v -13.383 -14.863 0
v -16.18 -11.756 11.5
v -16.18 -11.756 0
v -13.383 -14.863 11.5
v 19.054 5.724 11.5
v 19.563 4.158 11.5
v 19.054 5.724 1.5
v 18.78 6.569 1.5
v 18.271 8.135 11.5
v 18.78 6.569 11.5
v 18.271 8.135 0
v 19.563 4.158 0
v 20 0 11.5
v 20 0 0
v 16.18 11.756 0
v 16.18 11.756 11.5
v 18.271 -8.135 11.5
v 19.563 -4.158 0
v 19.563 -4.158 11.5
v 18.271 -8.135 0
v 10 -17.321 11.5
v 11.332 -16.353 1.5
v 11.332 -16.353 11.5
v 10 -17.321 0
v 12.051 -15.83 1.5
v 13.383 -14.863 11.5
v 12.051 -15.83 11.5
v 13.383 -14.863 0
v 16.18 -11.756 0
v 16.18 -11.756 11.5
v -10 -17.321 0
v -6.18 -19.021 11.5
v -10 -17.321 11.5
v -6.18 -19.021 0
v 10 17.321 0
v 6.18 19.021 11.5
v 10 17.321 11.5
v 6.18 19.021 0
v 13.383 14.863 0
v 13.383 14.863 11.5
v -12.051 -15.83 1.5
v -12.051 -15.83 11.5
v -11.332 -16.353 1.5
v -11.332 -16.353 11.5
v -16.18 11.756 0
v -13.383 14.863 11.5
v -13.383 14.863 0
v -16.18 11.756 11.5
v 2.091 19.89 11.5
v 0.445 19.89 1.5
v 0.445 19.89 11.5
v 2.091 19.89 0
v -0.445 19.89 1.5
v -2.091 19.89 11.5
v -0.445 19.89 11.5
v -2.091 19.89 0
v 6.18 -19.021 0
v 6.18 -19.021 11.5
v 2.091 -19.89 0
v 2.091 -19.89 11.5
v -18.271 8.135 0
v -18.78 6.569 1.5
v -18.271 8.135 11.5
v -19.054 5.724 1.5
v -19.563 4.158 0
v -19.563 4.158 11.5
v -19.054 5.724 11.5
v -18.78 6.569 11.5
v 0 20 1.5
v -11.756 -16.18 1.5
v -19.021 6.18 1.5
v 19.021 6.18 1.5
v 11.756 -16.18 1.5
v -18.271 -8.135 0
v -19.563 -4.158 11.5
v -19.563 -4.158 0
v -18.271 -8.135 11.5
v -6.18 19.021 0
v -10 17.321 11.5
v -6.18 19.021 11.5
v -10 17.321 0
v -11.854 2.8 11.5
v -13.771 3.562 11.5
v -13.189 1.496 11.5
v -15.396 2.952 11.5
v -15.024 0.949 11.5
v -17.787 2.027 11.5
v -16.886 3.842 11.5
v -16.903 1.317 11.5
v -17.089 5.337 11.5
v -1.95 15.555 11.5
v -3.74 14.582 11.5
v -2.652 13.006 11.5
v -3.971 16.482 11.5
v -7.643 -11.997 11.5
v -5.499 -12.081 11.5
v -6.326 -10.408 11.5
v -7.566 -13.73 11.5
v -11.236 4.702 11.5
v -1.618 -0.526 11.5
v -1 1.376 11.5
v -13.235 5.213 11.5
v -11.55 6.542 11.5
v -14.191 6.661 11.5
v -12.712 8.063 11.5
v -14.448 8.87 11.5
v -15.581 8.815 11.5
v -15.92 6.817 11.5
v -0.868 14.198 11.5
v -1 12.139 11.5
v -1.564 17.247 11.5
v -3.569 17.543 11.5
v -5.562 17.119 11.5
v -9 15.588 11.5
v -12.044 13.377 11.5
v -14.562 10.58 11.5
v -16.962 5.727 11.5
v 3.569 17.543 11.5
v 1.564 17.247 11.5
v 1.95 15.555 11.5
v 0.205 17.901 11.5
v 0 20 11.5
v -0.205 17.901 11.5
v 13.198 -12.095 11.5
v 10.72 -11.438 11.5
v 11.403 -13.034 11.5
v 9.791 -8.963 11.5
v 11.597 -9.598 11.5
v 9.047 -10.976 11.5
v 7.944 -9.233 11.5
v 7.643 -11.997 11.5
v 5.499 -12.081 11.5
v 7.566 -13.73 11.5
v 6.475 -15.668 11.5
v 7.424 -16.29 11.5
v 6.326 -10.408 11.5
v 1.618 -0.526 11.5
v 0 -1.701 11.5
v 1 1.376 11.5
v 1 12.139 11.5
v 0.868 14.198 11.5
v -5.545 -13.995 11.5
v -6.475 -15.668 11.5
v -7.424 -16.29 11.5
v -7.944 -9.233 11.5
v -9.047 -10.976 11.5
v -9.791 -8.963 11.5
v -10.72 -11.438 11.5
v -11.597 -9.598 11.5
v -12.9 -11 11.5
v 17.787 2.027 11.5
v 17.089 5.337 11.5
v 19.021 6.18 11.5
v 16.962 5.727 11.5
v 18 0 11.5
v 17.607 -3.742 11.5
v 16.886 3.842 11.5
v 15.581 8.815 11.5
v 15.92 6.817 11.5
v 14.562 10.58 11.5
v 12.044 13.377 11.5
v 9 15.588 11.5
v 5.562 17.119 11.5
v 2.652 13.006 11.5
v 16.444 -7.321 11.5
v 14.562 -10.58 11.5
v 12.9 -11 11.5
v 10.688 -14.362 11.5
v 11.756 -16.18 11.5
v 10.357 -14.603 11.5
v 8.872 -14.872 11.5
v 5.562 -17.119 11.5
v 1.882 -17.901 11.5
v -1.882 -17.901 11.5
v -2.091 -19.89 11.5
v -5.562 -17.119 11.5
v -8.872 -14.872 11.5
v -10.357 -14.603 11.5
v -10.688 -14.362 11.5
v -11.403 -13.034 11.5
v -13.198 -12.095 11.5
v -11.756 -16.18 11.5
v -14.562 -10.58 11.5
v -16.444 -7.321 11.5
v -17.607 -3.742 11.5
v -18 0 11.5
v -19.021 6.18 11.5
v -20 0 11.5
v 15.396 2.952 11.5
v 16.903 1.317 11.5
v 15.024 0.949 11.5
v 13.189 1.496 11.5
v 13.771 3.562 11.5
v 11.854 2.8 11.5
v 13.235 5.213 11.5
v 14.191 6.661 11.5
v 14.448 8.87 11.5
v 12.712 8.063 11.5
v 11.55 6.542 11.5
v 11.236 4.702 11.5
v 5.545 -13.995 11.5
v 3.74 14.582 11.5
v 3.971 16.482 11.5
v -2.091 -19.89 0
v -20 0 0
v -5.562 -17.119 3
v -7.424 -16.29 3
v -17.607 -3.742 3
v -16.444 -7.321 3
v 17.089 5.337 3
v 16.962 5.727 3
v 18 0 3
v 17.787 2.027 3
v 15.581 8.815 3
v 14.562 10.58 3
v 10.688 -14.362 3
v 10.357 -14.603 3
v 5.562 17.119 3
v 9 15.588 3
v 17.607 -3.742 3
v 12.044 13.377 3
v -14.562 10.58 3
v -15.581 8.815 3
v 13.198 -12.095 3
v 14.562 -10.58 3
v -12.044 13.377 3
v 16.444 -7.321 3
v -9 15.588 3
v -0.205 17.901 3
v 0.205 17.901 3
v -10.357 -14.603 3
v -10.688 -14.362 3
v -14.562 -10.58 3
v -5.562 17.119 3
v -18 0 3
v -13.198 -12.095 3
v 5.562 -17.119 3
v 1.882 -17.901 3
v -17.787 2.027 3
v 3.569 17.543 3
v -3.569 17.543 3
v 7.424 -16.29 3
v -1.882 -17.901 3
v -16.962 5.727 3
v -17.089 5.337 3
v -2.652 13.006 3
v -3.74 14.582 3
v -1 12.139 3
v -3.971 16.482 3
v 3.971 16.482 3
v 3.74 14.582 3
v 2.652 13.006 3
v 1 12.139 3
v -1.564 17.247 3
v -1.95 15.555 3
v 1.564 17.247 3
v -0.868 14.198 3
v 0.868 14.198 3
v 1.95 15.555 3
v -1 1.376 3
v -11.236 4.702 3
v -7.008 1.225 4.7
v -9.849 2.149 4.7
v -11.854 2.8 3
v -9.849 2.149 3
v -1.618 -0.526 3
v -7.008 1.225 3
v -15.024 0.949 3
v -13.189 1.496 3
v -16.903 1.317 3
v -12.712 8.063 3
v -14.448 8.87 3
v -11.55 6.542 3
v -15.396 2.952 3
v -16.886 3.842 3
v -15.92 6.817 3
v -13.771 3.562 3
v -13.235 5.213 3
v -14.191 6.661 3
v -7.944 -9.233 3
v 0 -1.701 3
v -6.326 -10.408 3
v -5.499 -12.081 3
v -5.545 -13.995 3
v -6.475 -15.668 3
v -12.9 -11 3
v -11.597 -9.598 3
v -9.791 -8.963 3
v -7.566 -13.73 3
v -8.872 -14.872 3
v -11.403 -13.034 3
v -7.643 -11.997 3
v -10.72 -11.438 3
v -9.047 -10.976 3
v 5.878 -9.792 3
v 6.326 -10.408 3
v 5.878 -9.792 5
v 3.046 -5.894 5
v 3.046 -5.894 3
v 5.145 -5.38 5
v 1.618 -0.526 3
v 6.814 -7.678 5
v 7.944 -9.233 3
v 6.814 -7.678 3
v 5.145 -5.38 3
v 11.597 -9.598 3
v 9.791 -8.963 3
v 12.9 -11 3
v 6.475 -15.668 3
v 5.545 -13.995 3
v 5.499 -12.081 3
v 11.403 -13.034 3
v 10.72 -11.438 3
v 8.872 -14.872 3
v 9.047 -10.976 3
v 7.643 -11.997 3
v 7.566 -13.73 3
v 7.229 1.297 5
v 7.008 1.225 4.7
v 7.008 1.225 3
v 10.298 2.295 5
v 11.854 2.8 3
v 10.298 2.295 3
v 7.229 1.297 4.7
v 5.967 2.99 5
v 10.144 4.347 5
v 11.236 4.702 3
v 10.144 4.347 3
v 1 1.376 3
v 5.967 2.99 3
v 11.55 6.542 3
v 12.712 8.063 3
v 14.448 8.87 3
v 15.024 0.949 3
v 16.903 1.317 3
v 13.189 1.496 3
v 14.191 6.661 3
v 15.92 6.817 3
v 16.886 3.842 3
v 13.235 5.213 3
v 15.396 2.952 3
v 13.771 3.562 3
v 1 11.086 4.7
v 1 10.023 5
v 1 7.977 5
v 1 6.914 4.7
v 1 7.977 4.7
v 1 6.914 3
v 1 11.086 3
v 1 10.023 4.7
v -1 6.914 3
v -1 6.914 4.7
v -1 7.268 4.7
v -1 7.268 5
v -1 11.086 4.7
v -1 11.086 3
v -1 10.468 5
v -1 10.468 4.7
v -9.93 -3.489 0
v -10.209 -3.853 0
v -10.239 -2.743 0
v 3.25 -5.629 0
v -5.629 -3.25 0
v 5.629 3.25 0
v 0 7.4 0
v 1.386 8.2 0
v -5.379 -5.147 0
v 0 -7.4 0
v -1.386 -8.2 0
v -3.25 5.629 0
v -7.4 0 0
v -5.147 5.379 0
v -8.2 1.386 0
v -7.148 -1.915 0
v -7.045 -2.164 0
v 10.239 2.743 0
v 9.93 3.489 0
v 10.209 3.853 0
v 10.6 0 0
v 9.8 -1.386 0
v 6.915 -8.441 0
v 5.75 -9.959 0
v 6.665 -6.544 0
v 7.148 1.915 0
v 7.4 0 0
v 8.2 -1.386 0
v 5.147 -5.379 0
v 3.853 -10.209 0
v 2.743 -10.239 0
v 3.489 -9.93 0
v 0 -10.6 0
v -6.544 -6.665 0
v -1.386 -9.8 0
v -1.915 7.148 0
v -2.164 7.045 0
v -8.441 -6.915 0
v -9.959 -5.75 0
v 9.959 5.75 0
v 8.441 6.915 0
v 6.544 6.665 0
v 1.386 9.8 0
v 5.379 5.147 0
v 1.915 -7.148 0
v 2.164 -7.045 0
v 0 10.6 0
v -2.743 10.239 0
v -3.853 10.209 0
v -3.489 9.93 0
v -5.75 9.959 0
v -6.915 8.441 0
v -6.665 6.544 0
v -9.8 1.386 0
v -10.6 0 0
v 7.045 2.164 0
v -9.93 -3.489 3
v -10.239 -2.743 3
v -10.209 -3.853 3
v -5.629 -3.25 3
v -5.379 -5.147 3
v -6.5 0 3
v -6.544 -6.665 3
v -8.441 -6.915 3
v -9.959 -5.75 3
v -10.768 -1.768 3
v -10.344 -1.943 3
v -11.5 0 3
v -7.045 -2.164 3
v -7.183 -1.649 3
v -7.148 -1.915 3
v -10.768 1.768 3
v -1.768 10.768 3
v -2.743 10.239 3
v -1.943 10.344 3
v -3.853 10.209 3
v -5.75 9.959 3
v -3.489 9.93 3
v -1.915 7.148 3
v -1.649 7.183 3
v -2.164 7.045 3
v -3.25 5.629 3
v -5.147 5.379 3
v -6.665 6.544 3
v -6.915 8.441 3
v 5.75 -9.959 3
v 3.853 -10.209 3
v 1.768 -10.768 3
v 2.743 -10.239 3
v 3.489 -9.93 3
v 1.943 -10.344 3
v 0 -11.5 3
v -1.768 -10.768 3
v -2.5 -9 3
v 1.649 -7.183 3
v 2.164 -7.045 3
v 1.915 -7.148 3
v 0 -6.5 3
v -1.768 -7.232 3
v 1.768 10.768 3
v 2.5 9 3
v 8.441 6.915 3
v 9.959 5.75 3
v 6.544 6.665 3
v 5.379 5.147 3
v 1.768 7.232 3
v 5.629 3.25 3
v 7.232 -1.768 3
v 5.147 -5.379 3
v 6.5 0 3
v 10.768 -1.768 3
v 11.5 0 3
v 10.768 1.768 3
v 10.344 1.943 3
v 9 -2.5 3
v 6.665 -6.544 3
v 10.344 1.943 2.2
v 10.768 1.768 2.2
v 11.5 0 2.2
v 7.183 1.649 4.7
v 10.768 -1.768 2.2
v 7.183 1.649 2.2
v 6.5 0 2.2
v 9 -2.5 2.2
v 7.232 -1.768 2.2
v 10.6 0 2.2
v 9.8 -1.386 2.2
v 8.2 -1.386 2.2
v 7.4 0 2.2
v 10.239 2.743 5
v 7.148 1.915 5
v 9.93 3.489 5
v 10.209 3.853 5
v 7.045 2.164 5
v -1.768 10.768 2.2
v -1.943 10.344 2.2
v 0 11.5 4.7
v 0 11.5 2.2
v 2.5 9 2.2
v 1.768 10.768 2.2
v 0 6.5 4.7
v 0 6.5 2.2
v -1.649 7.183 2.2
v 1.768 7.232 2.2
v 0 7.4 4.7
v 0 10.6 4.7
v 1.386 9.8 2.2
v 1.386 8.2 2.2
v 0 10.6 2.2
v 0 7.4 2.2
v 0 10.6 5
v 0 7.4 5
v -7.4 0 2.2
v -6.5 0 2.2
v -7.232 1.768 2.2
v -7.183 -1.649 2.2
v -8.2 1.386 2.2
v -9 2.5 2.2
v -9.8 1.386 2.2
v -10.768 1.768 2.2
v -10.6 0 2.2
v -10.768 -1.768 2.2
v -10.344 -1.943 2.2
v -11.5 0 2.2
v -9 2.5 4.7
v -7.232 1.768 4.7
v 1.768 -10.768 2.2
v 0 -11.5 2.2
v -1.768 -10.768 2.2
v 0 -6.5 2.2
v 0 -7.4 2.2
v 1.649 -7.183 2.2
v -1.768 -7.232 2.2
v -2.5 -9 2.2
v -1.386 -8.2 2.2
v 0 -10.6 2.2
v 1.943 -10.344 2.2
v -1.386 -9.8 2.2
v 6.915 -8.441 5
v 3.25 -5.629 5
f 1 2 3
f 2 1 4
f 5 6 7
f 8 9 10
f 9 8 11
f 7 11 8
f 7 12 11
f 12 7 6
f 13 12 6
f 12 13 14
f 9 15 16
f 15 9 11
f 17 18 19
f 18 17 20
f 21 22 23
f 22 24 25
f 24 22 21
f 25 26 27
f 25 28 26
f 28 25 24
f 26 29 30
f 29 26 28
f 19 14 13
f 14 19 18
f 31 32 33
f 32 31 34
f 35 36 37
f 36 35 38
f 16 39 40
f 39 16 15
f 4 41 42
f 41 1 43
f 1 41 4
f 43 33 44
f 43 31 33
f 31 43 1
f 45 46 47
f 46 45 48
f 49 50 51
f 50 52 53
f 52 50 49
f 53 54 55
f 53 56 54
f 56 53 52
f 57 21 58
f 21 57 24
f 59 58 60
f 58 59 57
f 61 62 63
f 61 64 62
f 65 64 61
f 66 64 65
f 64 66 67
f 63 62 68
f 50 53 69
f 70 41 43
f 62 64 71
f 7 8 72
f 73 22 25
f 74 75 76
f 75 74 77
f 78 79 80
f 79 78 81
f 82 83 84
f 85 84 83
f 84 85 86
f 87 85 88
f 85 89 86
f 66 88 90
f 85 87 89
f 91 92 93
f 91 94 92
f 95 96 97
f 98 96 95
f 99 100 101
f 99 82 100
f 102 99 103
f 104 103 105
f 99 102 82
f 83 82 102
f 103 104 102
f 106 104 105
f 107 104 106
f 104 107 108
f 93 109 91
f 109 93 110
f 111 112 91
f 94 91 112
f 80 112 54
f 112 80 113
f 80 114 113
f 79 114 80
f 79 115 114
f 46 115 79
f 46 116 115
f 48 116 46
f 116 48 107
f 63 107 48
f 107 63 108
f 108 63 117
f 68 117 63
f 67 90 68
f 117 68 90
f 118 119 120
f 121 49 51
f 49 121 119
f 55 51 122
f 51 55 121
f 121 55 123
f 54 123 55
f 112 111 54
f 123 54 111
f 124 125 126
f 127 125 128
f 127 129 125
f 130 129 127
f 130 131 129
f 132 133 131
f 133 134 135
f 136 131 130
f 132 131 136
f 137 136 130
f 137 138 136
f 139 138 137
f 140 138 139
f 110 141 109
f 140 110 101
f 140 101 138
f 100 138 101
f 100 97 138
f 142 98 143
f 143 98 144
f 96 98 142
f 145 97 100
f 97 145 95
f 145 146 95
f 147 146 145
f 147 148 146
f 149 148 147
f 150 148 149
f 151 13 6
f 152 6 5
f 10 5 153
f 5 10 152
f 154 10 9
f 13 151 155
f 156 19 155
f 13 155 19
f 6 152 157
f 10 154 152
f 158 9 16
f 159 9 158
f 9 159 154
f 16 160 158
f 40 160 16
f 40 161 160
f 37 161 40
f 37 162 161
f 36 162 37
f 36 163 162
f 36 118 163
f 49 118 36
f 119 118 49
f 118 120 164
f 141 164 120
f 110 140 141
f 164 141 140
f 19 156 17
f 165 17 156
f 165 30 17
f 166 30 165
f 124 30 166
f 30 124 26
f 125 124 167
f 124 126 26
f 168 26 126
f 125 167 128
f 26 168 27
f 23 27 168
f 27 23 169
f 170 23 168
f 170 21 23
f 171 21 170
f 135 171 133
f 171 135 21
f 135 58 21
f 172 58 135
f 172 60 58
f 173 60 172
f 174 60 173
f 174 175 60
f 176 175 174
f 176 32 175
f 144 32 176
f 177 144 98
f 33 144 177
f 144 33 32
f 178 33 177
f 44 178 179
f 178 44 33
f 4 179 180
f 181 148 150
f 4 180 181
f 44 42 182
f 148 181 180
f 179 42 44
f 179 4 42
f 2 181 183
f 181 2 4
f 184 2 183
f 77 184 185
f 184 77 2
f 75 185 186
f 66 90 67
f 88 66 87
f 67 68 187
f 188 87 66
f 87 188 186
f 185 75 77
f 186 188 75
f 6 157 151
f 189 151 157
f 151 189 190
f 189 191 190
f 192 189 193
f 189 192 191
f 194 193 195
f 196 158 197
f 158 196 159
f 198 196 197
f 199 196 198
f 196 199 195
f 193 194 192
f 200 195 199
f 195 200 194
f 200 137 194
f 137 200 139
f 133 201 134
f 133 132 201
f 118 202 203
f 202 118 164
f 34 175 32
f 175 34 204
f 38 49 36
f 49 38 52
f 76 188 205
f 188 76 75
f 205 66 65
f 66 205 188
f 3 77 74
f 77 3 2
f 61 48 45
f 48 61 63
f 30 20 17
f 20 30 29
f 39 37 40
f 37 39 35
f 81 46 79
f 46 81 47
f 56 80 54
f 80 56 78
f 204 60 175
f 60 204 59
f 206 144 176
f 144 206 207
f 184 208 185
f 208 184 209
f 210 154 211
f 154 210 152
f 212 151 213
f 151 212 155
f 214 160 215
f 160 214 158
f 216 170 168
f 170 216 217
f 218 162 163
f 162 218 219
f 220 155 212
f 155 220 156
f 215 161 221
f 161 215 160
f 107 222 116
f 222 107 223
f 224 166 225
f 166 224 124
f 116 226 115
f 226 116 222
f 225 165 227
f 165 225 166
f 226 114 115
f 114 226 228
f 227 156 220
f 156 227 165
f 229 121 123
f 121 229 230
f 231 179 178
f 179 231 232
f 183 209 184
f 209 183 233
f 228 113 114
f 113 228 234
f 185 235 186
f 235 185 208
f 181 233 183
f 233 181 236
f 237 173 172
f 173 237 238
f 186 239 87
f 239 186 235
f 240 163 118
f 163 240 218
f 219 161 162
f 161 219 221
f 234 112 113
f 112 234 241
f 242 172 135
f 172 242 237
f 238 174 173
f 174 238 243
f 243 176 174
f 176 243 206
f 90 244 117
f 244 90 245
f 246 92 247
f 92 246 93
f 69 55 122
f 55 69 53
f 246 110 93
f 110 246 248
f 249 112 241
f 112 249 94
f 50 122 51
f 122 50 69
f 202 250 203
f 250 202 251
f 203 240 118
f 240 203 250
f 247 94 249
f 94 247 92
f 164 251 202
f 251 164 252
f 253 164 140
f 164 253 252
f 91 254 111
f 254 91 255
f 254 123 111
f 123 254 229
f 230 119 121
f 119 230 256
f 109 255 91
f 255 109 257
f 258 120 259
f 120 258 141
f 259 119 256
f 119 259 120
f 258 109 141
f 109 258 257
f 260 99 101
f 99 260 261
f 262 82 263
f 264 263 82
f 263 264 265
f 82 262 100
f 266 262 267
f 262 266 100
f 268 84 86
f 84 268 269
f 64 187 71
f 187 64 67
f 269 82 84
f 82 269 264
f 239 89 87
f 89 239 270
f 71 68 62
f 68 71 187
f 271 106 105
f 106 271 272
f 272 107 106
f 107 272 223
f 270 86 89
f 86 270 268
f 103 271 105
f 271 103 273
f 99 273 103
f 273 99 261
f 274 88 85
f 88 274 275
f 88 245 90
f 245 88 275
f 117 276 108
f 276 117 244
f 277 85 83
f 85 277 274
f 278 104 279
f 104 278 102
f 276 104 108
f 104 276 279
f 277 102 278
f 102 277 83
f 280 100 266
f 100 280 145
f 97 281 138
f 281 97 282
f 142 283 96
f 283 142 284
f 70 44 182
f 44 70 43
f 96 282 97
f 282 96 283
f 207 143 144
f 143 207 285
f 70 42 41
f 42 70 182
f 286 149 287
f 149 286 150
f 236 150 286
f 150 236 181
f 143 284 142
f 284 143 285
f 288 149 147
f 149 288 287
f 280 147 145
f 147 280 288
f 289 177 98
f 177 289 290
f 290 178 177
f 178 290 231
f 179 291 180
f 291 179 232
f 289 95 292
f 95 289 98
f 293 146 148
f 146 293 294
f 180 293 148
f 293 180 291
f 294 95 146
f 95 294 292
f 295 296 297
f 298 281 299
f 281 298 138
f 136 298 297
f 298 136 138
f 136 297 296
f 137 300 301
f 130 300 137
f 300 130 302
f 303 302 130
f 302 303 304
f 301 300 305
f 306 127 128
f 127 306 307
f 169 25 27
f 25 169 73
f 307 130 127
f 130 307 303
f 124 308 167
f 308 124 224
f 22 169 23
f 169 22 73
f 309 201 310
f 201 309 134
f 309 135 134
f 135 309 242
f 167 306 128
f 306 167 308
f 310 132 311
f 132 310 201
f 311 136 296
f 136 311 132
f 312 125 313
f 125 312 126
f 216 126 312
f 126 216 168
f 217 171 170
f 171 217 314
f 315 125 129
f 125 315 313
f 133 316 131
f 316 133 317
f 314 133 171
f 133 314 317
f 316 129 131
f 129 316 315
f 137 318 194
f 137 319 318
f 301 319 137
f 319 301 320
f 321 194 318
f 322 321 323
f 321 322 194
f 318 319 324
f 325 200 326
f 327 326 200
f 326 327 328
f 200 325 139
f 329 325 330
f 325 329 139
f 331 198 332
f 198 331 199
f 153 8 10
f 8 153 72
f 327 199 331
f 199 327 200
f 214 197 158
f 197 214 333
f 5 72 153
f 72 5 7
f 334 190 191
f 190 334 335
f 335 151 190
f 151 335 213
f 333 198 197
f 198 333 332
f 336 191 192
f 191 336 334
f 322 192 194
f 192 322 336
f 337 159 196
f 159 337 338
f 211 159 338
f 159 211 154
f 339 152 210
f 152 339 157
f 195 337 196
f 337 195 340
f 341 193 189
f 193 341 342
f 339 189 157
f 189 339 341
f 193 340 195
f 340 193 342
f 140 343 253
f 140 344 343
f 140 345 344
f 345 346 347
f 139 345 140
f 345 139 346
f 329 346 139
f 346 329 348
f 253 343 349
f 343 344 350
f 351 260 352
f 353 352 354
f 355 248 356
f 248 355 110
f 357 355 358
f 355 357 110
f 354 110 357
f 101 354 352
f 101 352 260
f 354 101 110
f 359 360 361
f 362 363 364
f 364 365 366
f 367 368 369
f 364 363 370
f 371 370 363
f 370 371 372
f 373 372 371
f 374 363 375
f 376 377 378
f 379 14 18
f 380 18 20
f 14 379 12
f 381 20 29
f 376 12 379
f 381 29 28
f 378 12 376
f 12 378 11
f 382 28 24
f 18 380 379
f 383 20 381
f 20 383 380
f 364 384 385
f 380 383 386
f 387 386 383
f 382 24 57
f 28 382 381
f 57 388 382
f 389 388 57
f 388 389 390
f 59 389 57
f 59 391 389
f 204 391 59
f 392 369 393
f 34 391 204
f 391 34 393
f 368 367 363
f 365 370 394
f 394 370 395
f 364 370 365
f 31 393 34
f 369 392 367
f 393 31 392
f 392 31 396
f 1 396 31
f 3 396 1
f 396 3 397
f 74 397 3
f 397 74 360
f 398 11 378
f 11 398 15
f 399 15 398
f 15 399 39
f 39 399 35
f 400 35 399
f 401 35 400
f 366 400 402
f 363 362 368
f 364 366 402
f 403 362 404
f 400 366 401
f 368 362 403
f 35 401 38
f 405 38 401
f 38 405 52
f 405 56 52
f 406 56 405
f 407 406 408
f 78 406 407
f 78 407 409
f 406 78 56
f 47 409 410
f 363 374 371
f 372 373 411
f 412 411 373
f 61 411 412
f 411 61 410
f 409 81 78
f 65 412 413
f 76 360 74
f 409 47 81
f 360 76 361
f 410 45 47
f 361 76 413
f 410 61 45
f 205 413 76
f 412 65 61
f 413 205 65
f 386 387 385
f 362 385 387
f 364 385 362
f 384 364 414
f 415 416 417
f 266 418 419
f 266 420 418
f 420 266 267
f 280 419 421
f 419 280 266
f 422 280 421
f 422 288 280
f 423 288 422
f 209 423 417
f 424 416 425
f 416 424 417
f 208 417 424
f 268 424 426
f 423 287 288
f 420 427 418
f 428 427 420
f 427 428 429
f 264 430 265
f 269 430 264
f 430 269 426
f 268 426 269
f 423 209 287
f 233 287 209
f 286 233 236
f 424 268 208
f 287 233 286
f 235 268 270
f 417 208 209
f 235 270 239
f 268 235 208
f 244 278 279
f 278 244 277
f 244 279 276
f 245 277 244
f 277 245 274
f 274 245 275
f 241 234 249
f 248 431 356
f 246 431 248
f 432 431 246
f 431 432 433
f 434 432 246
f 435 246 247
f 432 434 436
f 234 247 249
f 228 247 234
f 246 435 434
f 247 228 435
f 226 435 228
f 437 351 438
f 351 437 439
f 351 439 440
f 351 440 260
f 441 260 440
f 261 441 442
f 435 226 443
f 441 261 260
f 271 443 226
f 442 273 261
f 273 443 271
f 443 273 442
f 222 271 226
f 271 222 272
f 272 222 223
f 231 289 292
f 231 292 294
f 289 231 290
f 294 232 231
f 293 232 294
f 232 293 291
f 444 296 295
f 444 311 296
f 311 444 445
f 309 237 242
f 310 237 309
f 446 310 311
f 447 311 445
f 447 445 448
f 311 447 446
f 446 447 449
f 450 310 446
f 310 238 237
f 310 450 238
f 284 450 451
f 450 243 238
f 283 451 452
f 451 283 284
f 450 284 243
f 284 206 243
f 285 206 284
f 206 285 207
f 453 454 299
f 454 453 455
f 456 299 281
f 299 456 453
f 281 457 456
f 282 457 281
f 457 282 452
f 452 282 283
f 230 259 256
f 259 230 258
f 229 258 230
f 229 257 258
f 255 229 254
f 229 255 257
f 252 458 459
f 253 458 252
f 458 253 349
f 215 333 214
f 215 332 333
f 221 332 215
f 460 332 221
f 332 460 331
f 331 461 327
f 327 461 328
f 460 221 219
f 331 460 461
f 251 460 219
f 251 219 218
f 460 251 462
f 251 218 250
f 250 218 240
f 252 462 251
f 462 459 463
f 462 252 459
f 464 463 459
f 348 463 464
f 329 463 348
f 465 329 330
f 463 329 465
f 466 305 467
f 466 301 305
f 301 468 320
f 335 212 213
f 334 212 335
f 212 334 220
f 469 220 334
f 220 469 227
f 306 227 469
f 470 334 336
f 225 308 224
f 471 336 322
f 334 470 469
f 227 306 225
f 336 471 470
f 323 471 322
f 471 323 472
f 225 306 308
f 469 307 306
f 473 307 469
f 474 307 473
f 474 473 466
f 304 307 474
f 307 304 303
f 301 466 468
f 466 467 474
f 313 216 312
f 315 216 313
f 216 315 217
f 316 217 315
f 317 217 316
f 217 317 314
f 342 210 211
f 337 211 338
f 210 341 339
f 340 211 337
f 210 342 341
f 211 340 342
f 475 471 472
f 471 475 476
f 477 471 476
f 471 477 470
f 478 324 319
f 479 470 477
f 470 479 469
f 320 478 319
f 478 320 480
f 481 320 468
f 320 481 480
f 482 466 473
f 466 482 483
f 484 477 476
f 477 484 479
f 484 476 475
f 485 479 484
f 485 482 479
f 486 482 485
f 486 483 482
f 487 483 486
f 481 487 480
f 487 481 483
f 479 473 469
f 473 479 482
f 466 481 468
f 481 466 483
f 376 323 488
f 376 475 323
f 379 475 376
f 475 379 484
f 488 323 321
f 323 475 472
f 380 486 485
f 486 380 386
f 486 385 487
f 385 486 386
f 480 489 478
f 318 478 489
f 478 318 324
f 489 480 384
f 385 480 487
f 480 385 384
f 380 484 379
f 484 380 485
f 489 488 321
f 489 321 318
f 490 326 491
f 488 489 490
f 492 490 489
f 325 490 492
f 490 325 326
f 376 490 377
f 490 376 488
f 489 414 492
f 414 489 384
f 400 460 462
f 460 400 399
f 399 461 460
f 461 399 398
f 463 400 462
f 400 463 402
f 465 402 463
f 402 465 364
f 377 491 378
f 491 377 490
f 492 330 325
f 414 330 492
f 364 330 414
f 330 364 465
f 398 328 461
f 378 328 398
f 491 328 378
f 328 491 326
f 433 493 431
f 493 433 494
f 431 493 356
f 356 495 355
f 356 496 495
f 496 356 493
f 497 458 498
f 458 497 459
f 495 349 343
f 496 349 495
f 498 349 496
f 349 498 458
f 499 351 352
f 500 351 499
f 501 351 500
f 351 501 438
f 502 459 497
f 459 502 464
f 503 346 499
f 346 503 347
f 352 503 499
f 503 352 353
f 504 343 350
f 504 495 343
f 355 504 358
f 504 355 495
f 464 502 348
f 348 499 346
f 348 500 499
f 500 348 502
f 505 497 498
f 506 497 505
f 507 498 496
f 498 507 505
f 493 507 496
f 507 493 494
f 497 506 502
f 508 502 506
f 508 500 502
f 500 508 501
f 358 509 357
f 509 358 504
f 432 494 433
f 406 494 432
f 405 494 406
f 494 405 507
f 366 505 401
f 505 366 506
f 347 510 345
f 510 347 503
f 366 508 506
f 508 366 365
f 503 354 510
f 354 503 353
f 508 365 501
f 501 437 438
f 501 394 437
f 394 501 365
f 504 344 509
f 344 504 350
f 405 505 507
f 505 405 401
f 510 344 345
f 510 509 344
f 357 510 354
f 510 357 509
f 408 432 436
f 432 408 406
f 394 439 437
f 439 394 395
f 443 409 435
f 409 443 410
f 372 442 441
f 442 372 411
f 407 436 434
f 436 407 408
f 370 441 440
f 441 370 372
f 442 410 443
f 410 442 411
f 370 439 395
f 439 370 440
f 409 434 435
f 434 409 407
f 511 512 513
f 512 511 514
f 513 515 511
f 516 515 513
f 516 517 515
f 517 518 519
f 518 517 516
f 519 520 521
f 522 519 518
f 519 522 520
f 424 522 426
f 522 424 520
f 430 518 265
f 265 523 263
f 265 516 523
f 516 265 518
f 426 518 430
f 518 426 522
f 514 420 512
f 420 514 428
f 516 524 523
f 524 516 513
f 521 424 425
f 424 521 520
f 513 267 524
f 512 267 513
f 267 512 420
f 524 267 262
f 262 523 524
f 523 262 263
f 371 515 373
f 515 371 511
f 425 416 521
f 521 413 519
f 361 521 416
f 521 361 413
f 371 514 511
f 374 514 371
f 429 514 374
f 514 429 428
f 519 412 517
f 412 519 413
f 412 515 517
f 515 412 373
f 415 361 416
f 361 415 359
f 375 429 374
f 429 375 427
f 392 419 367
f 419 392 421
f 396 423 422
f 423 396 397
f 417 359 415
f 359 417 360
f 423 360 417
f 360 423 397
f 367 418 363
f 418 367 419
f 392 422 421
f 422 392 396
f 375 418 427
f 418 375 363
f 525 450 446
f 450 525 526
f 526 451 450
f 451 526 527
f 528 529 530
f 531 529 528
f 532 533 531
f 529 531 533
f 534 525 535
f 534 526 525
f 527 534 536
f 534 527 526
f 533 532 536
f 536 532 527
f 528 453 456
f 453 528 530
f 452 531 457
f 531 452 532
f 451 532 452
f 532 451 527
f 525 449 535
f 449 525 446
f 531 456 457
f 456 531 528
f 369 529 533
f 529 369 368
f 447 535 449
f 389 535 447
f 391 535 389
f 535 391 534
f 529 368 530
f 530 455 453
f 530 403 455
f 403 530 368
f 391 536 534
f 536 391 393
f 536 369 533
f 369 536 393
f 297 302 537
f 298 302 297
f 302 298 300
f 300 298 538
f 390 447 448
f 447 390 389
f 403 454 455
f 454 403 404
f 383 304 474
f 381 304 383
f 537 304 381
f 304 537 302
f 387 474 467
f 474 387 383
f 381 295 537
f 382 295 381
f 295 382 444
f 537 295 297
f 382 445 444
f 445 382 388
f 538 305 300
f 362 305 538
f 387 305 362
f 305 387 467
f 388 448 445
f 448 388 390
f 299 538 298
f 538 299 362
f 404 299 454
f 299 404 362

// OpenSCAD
noseConeLength = 10;
noseConeCapHeight = 3;
motorRadius = 20;
boltDiameter = 1.6;
boltCapDiameter = 2.5;
boltDistance = 9;
wallThickness = 2;
loopCount=4;
ribSpacing = 40;
ribThickness = 2;
skewerRadius = 2.0; // 2.8/2;

module fuselageBlock(chordLength, wingspan, fuselageRadius, fuselageLength){
    translate([-chordLength,0,-fuselageRadius]) rotate([0,90,0]) makeRibs(fuselageRadius/2, fuselageRadius, chordLength);
    translate([0,0,-fuselageRadius]) rotate([0,90,0]) makeRibs(fuselageRadius, fuselageRadius, chordLength);
    translate([chordLength,0,-fuselageRadius]) rotate([0,90,0]) makeRibs(fuselageRadius, fuselageRadius/4, fuselageLength - chordLength*2);
}

module makeRibs(startRadius, endRadius, sectionLength){
    echo(str("sectionLength: ",sectionLength));
    numberOfRibs = sectionLength/ribSpacing;
    echo(str("ribSpacing: ", ribSpacing));
    echo(str("numberOfRibs: ",numberOfRibs));
    for (ribPosition = [0:numberOfRibs]){
        //echo("ribPosition",ribPosition);
        //r1=startRadius; r2=endRadius;
        translate([0,0,ribSpacing*ribPosition])
        fuselageRib(
            startRadius+((endRadius-startRadius)/numberOfRibs*ribPosition),
            ribThickness, 1, 6, skewerRadius, true);
    }
}

module fuselageRib(ribRadius, ribThickness, wallThickness, loopCount, skewerRadius, doubleLoops){
    echo(str("fuselageRib(", ribRadius, ",", ribThickness, ",", wallThickness, ",", loopCount, ",", skewerRadius,",",doubleLoops, ")"));
    union(){
        difference(){
            cylinder(r=ribRadius, h=ribThickness, center=true);
            cylinder(r=ribRadius-wallThickness, h=ribThickness*3, center=true);
        }
        for (rotation=[1:5]){
            rotate([0,0,(360/5)*rotation]) {
                translate([-wallThickness/2,0,-ribThickness/2]) cube([wallThickness,ribRadius-skewerRadius*2-wallThickness,ribThickness], center=false);
                rotate([0,0,18]) { // i have no idea why this rotate is required, the cube and the cylinder should have the same translation matrix at this point
                    // make the inner supports and skewer loops
                    translate([ribRadius-skewerRadius-wallThickness,0,0]){
                        difference(){
                            cylinder(h=ribThickness, r=skewerRadius+wallThickness, center=true);
                            cylinder(h=ribThickness*3, r=skewerRadius, center=true);
                        }
                    }
                    if (doubleLoops == true){
                        // add the loops used to join the skewers
                        rotate([0,0,(360/5)*rotation+(360/5)/2])
                        translate([ribRadius-skewerRadius-wallThickness,0,0]){
                            difference(){
                                cylinder(h=ribThickness, r=skewerRadius+wallThickness, center=true);
                                cylinder(h=ribThickness*3, r=skewerRadius, center=true);
                            }
                        }
                    }
                }
            }
        }
    }
}

module noseCone(){
    echo(str("noseCone(", noseConeLength, motorRadius, boltDiameter, boltDistance, wallThickness, loopCount, skewerRadius, ");"));
    ribRadius = motorRadius;
    difference(){
        union(){
            translate([0,0,noseConeCapHeight/2])cylinder(h=noseConeCapHeight, r=motorRadius, center=true);
            translate([0,0,noseConeLength/2+noseConeCapHeight/2])fuselageRib(motorRadius,noseConeLength, wallThickness, loopCount, skewerRadius, false);
        }
        for (rotation = [0,90,180,270]){
            // make a hole for the bolt head through the strut
            rotate([0,0,rotation])translate([boltDistance,0,noseConeCapHeight+(boltCapDiameter/2)-0.8]) cylinder(h=boltCapDiameter, r=boltCapDiameter, center=true);
            // make the bolt hole and the space for the bolt cap to be passed through
            hull(){
                rotate([0,0,rotation])translate([boltDistance,0,0]) cylinder(h=noseConeLength, r=boltDiameter, center=true);
                rotate([0,0,rotation+15])translate([boltDistance,0,0]) cylinder(h=noseConeLength, r=boltDiameter, center=true);
            }
            hull(){
                rotate([0,0,rotation+15])translate([boltDistance,0,0]) cylinder(h=noseConeLength, r=boltDiameter, center=true);
                rotate([0,0,rotation+30])translate([boltDistance,0,0]) cylinder(h=noseConeLength, r=boltDiameter, center=true);
            }
            rotate([0,0,rotation+30])translate([boltDistance,0,0]) cylinder(h=noseConeLength, r=boltCapDiameter, center=true);
        }
    }
}

module printPlate01(){
    translate([00,45,0]) fuselageRib(15,2,1,6,2.0, true);
    translate([50,-5,0]) fuselageRib(18.75,2,1,6,2.0, true);
    translate([40,40,0]) fuselageRib(22.5,2,1,6,2.0, true);
    translate([00,00,0]) fuselageRib(26.25,2,1,6,2.0, true);
}

module printPlate02(){
    translate([00,45,0]) fuselageRib(7.5,2,1,6,2.0, true);
    translate([50,-5,0]) fuselageRib(10.7143,2,1,6,2.0, true);
    translate([40,40,0]) fuselageRib(13.9286,2,1,6,2.0, true);
    translate([00,00,0]) fuselageRib(17.1429,2,1,6,2.0, true);
}

module printPlate03(){
    translate([100-21,21,0]) fuselageRib(20.3571,2,1,6,2.0, true);
    translate([100-24-10,21*2+24,0]) fuselageRib(23.5714,2,1,6,2.0, true);
    translate([27,27,0]) fuselageRib(26.7857,2,1,6,2.0, true);
}

module printPlate04(){
    translate([30,30,0]) fuselageRib(30,2,1,6,2.0, true);
    //translate([100-30,100-30,0]) fuselageRib(30,2,1,6,2.0, true);
}

//fuselage(160, 640);
noseCone();

//%cube(100);
//printPlate01();
//printPlate02();
//printPlate03();
//printPlate04();
/*
ECHO: "fuselageRib(30,2,1,6,2, true)"
ECHO: "fuselageRib(30,2,1,6,2, true)"
ECHO: "fuselageRib(30,2,1,6,2, true)"
ECHO: "fuselageRib(30,2,1,6,2, true)"
ECHO: "fuselageRib(30,2,1,6,2, true)"
*/
